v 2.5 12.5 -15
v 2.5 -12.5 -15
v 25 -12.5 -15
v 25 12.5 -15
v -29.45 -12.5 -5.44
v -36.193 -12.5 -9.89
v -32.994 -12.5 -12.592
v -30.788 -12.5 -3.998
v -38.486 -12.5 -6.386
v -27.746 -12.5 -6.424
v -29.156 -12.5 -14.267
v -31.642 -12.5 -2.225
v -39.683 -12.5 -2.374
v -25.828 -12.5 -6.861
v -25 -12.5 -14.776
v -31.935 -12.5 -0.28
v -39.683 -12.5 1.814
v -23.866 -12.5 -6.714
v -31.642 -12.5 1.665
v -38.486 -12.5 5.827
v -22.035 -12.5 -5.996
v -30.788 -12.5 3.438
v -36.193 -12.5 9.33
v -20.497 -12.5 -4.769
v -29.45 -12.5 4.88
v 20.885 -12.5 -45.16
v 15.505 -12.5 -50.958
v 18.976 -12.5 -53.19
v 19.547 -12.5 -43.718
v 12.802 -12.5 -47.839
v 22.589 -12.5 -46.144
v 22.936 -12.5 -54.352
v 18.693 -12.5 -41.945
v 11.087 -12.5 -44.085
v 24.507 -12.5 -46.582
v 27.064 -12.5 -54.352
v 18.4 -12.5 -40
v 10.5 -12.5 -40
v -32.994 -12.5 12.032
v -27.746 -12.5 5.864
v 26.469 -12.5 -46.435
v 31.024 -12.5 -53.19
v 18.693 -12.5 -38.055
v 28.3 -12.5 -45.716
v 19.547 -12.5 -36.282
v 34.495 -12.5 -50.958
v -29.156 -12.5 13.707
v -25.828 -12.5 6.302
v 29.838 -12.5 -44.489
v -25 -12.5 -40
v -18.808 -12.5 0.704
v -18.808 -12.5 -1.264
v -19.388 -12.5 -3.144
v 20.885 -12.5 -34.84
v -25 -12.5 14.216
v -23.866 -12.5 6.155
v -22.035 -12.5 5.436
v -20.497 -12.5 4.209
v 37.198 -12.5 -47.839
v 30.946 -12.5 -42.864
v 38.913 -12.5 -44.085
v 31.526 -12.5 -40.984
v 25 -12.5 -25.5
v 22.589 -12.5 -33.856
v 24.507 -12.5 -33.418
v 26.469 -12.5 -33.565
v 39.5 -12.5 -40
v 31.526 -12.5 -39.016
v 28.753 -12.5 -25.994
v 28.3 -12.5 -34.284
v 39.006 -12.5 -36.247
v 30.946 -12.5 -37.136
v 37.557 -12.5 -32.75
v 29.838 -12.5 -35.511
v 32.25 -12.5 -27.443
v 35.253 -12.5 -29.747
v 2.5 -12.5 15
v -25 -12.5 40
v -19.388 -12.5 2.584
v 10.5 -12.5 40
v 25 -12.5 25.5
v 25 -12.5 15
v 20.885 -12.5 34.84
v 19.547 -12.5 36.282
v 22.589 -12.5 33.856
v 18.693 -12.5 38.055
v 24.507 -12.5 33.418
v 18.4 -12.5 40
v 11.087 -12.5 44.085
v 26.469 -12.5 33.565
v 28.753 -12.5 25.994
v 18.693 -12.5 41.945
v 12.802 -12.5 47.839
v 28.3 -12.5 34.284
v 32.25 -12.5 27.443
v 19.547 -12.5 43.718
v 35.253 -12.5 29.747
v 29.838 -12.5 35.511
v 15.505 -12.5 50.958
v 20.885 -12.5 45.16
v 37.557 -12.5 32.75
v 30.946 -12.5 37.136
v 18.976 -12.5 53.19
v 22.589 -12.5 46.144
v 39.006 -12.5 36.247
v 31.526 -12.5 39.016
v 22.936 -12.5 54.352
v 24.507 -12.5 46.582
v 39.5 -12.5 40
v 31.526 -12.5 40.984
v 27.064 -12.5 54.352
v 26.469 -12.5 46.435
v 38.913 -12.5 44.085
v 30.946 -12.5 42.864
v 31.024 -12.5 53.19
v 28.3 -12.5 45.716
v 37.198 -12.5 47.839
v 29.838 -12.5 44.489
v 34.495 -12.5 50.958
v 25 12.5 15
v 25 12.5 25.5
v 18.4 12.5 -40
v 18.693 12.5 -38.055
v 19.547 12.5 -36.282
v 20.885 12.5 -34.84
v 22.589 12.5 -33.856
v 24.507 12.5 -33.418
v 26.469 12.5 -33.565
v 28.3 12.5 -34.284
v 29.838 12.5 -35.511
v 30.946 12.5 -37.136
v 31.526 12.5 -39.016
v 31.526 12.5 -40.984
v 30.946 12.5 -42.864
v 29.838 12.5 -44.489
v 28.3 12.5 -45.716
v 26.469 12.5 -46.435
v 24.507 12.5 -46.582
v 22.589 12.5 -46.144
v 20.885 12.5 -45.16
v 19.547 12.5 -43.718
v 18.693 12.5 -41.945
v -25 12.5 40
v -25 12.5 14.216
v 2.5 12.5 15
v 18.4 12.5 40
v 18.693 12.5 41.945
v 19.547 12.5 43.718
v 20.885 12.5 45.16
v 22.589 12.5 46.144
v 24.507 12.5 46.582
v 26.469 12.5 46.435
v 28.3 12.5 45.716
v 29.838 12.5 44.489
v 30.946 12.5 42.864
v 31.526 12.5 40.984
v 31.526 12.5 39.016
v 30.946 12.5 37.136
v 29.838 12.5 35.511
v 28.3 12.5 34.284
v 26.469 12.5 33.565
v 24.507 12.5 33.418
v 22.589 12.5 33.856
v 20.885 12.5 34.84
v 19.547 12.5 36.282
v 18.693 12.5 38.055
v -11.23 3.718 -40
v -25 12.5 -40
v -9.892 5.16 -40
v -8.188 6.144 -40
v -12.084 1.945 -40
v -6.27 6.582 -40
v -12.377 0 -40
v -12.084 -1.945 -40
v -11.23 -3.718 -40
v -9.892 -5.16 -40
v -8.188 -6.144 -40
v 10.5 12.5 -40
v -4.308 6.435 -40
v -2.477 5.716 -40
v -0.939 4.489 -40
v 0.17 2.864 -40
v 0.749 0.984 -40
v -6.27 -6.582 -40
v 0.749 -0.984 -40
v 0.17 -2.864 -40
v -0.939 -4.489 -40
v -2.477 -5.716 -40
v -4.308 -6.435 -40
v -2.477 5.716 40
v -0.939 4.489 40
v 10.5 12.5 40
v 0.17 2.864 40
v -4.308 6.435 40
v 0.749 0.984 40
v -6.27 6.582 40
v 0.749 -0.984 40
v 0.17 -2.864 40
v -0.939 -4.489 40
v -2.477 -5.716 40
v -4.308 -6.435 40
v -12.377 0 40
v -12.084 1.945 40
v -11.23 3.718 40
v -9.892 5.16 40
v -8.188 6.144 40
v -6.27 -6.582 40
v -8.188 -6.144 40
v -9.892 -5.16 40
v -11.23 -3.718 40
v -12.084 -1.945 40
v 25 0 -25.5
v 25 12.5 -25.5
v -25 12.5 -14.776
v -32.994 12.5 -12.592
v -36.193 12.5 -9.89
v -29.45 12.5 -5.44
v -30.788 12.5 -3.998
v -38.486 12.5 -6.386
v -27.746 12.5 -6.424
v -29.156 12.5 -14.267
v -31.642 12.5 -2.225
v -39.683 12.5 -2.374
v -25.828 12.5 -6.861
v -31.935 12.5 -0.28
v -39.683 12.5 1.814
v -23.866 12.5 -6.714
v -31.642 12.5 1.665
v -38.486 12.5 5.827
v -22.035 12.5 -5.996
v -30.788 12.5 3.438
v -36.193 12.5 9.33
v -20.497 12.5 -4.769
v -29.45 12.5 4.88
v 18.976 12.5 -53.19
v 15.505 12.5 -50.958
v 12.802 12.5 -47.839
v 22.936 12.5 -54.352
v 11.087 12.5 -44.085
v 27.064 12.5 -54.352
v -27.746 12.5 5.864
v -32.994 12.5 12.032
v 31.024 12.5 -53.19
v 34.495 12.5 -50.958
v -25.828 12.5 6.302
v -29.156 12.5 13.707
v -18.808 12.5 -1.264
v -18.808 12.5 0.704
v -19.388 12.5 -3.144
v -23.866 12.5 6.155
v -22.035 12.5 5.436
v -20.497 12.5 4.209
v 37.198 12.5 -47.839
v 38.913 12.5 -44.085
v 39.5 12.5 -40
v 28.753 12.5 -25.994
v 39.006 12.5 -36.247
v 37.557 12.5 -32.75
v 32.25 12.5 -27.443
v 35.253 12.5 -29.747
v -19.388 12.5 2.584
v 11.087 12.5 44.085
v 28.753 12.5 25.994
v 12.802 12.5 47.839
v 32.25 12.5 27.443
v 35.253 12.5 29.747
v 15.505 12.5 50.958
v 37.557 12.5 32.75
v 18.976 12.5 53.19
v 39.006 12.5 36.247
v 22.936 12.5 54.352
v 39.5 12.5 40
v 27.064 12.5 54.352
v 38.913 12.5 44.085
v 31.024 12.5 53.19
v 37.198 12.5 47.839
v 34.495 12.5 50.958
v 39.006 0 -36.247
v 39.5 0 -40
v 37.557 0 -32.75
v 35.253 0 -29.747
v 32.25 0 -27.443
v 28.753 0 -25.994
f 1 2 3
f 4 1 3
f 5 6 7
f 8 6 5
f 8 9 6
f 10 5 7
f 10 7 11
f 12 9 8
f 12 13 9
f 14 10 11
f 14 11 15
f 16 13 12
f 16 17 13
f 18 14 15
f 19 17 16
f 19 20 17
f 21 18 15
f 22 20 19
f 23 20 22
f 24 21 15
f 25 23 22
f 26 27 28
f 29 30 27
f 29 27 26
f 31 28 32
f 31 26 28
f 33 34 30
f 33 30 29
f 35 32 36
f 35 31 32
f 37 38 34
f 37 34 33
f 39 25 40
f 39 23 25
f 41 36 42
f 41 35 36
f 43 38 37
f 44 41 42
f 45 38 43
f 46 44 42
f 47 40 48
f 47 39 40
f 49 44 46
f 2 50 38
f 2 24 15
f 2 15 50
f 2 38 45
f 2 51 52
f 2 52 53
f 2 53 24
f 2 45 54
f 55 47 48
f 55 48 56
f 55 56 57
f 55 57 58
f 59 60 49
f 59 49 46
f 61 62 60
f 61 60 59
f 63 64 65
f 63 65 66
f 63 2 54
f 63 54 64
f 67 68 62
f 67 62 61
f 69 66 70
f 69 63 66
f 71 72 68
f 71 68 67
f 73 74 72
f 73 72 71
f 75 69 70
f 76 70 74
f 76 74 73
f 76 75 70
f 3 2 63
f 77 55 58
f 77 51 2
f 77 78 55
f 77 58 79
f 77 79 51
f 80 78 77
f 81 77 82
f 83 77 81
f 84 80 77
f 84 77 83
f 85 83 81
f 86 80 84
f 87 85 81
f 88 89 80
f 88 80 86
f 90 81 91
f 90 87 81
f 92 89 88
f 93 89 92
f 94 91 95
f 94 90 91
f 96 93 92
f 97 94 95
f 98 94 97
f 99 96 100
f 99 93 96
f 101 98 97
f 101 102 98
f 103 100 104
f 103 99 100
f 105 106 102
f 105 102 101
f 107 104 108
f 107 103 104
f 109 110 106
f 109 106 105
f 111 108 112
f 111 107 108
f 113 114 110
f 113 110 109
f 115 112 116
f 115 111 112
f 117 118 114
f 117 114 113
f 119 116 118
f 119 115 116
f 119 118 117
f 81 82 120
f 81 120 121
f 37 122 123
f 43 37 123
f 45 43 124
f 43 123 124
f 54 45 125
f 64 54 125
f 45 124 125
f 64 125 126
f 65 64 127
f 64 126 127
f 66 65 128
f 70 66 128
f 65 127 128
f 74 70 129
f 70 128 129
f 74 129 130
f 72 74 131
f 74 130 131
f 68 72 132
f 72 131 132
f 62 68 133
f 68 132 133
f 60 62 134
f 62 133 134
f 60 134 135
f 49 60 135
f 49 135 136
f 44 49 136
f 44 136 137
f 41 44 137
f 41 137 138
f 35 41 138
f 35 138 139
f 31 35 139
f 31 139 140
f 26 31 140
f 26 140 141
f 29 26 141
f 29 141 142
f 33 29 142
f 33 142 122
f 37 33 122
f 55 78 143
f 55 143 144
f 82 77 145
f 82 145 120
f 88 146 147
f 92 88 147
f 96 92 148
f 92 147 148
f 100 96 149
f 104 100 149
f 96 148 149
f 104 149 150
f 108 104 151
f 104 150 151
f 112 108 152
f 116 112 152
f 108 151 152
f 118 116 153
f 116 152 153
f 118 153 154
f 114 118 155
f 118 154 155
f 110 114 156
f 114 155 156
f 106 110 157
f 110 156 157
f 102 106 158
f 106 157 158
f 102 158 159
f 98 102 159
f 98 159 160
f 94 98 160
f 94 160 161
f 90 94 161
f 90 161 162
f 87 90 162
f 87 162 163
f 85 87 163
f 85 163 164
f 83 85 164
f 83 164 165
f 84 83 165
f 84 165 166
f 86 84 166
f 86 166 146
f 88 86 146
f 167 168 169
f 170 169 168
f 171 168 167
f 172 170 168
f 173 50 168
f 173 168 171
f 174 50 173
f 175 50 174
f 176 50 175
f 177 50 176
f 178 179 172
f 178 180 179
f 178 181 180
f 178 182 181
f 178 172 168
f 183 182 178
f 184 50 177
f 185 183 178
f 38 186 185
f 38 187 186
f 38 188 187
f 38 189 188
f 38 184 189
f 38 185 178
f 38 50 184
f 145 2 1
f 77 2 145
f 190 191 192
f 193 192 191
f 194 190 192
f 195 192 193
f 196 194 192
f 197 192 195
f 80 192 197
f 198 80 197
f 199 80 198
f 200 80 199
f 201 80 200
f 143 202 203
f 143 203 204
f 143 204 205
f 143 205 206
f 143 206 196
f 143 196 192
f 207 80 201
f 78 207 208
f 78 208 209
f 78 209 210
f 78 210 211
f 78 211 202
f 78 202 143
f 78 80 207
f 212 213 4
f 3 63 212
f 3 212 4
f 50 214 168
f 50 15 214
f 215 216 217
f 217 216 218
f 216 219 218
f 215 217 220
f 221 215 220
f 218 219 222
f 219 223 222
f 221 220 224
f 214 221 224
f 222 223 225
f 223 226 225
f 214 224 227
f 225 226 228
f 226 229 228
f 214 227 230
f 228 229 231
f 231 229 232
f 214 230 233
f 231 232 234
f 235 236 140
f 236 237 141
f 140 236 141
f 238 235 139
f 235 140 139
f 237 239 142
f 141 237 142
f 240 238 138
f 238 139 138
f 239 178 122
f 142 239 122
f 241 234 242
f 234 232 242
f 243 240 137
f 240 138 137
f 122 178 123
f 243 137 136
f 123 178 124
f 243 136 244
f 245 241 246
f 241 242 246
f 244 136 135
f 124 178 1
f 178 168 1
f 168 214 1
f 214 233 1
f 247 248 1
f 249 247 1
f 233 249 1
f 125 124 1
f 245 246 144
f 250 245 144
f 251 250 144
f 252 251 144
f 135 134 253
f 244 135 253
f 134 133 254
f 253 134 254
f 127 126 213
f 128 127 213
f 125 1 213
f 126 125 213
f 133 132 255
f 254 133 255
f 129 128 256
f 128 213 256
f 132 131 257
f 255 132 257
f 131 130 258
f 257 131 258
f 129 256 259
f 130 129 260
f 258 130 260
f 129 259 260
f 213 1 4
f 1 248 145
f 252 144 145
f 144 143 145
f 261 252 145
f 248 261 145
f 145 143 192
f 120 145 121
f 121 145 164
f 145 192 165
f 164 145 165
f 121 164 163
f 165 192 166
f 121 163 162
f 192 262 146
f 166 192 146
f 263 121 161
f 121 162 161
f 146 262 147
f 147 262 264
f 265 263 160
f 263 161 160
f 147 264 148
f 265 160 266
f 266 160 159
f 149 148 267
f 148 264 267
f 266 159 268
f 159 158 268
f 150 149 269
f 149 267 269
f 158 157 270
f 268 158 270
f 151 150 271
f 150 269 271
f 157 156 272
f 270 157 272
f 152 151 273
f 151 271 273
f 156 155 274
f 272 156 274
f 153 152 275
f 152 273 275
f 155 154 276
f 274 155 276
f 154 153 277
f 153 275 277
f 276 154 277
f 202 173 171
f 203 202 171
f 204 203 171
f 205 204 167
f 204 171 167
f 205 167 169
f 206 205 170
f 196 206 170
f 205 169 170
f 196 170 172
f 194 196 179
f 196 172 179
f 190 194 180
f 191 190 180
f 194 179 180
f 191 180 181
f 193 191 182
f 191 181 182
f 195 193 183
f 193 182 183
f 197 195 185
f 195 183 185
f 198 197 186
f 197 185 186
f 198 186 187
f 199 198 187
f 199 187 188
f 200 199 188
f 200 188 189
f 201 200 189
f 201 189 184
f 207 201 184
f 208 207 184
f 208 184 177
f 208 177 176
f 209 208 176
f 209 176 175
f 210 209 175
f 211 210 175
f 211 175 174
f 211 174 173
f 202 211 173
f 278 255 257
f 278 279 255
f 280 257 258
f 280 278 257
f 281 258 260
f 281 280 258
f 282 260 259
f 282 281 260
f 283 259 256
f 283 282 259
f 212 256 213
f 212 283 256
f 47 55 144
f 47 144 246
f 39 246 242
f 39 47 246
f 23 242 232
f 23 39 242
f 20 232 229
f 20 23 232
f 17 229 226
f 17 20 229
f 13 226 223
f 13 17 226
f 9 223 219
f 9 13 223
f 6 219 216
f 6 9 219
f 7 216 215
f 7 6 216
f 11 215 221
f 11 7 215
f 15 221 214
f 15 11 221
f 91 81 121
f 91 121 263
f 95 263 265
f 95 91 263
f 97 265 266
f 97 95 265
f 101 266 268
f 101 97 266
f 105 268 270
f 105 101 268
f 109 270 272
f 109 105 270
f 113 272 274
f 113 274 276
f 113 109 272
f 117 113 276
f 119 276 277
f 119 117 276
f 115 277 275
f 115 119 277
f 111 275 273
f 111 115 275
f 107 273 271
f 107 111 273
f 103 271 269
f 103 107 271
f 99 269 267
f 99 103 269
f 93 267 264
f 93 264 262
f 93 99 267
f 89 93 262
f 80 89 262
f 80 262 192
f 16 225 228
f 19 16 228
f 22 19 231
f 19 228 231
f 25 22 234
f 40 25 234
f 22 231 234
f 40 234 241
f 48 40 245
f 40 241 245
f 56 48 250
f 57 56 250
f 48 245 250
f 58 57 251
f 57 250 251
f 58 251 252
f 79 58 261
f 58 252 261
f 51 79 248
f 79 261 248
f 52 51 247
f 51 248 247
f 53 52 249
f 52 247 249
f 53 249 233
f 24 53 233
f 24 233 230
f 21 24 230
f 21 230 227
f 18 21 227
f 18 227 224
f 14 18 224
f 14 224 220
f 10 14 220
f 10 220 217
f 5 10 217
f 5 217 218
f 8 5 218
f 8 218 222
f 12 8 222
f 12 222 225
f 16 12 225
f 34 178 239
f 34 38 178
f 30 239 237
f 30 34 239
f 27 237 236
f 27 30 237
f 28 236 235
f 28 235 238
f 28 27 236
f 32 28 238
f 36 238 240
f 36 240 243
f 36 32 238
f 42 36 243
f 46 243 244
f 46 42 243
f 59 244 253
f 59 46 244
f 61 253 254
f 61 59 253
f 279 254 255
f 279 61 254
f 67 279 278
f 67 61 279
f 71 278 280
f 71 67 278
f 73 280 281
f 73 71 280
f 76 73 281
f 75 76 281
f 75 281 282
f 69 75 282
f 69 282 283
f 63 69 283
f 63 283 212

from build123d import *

# Parameters (mm, degrees)
F1_DEPTH       = 12.5
F3_D           = 13.2
F3_CBORE_D     = 19.25
F3_CBORE_DEPTH = 0
F5_D           = 13.2
F5_CBORE_D     = 19.25
F5_CBORE_DEPTH = 0
F6_W           = 45
F6_H           = 30
F7_DEPTH       = 30


with BuildPart() as f1:
    # F0 (on Front) → F1 (new body, symmetric)
    with BuildSketch(Plane.XZ):
        with BuildLine():
            Line((25, -25.5), (25, -40))
            Line((25, -40), (10.5, -40))
            ThreePointArc((10.5, -40), (25, -54.5), (39.5, -40))
            ThreePointArc((39.5, -40), (35.2530483272, -29.7469516728), (25, -25.5))
        make_face()
        with BuildLine():
            Line((10.5, -40), (25, -40))
            Line((25, -40), (25, -25.5))
            ThreePointArc((25, -25.5), (14.7469516728, -29.7469516728), (10.5, -40))
        make_face()
        with BuildLine():
            Line((-25, -40), (10.5, -40))
            ThreePointArc((10.5, -40), (14.7469516728, -29.7469516728), (25, -25.5))
            Line((25, -25.5), (25, 25.5))
            ThreePointArc((25, 25.5), (14.7469516728, 29.7469516728), (10.5, 40))
            Line((10.5, 40), (-25, 40))
            Line((-25, 40), (-25, 14.2162181315))
            ThreePointArc((-25, 14.2162181315), (-14.9640357801, 9.8540823977), (-10.8347666082, -0.279916916))
            ThreePointArc((-10.8347666082, -0.279916916), (-14.9640357801, -10.4139162298), (-25, -14.7760519636))
            Line((-25, -14.7760519636), (-25, -40))
        make_face()
        with BuildLine():
            ThreePointArc((10.5, 40), (14.7469516728, 29.7469516728), (25, 25.5))
            Line((25, 25.5), (25, 40))
            Line((25, 40), (10.5, 40))
        make_face()
        with BuildLine():
            Line((25, 40), (25, 25.5))
            ThreePointArc((25, 25.5), (35.2530483272, 29.7469516728), (39.5, 40))
            ThreePointArc((39.5, 40), (25, 54.5), (10.5, 40))
            Line((10.5, 40), (25, 40))
        make_face()
        with BuildLine():
            ThreePointArc((-25, 14.2162181315), (-39.8347666082, -0.279916916), (-25, -14.7760519636))
            Line((-25, -14.7760519636), (-25, 14.2162181315))
        make_face()
        with BuildLine():
            Line((-25, 14.2162181315), (-25, -14.7760519636))
            ThreePointArc((-25, -14.7760519636), (-14.9640357801, -10.4139162298), (-10.8347666082, -0.279916916))
            ThreePointArc((-10.8347666082, -0.279916916), (-14.9640357801, 9.8540823977), (-25, 14.2162181315))
        make_face()
    extrude(amount=F1_DEPTH, both=True)

    # F3 (through all)
    with Locations(Plane.XZ.offset(12.5)):
        with Locations((25, 40), (-25.3347666082, -0.279916916), (25, -40)):
            CounterBoreHole(F3_D / 2, F3_CBORE_D / 2, F3_CBORE_DEPTH)

    # F5 (through all)
    with Locations(Plane.XY.offset(40)):
        with Locations((-5.7768835686, 0)):
            CounterBoreHole(F5_D / 2, F5_CBORE_D / 2, F5_CBORE_DEPTH)

    # F6 (on face) → F7 (cut)
    with BuildSketch(Plane.XZ.offset(12.5)):
        with Locations((25, 0)):
            Rectangle(F6_W, F6_H)
    extrude(amount=-F7_DEPTH, mode=Mode.SUBTRACT)


solid = f1.part
